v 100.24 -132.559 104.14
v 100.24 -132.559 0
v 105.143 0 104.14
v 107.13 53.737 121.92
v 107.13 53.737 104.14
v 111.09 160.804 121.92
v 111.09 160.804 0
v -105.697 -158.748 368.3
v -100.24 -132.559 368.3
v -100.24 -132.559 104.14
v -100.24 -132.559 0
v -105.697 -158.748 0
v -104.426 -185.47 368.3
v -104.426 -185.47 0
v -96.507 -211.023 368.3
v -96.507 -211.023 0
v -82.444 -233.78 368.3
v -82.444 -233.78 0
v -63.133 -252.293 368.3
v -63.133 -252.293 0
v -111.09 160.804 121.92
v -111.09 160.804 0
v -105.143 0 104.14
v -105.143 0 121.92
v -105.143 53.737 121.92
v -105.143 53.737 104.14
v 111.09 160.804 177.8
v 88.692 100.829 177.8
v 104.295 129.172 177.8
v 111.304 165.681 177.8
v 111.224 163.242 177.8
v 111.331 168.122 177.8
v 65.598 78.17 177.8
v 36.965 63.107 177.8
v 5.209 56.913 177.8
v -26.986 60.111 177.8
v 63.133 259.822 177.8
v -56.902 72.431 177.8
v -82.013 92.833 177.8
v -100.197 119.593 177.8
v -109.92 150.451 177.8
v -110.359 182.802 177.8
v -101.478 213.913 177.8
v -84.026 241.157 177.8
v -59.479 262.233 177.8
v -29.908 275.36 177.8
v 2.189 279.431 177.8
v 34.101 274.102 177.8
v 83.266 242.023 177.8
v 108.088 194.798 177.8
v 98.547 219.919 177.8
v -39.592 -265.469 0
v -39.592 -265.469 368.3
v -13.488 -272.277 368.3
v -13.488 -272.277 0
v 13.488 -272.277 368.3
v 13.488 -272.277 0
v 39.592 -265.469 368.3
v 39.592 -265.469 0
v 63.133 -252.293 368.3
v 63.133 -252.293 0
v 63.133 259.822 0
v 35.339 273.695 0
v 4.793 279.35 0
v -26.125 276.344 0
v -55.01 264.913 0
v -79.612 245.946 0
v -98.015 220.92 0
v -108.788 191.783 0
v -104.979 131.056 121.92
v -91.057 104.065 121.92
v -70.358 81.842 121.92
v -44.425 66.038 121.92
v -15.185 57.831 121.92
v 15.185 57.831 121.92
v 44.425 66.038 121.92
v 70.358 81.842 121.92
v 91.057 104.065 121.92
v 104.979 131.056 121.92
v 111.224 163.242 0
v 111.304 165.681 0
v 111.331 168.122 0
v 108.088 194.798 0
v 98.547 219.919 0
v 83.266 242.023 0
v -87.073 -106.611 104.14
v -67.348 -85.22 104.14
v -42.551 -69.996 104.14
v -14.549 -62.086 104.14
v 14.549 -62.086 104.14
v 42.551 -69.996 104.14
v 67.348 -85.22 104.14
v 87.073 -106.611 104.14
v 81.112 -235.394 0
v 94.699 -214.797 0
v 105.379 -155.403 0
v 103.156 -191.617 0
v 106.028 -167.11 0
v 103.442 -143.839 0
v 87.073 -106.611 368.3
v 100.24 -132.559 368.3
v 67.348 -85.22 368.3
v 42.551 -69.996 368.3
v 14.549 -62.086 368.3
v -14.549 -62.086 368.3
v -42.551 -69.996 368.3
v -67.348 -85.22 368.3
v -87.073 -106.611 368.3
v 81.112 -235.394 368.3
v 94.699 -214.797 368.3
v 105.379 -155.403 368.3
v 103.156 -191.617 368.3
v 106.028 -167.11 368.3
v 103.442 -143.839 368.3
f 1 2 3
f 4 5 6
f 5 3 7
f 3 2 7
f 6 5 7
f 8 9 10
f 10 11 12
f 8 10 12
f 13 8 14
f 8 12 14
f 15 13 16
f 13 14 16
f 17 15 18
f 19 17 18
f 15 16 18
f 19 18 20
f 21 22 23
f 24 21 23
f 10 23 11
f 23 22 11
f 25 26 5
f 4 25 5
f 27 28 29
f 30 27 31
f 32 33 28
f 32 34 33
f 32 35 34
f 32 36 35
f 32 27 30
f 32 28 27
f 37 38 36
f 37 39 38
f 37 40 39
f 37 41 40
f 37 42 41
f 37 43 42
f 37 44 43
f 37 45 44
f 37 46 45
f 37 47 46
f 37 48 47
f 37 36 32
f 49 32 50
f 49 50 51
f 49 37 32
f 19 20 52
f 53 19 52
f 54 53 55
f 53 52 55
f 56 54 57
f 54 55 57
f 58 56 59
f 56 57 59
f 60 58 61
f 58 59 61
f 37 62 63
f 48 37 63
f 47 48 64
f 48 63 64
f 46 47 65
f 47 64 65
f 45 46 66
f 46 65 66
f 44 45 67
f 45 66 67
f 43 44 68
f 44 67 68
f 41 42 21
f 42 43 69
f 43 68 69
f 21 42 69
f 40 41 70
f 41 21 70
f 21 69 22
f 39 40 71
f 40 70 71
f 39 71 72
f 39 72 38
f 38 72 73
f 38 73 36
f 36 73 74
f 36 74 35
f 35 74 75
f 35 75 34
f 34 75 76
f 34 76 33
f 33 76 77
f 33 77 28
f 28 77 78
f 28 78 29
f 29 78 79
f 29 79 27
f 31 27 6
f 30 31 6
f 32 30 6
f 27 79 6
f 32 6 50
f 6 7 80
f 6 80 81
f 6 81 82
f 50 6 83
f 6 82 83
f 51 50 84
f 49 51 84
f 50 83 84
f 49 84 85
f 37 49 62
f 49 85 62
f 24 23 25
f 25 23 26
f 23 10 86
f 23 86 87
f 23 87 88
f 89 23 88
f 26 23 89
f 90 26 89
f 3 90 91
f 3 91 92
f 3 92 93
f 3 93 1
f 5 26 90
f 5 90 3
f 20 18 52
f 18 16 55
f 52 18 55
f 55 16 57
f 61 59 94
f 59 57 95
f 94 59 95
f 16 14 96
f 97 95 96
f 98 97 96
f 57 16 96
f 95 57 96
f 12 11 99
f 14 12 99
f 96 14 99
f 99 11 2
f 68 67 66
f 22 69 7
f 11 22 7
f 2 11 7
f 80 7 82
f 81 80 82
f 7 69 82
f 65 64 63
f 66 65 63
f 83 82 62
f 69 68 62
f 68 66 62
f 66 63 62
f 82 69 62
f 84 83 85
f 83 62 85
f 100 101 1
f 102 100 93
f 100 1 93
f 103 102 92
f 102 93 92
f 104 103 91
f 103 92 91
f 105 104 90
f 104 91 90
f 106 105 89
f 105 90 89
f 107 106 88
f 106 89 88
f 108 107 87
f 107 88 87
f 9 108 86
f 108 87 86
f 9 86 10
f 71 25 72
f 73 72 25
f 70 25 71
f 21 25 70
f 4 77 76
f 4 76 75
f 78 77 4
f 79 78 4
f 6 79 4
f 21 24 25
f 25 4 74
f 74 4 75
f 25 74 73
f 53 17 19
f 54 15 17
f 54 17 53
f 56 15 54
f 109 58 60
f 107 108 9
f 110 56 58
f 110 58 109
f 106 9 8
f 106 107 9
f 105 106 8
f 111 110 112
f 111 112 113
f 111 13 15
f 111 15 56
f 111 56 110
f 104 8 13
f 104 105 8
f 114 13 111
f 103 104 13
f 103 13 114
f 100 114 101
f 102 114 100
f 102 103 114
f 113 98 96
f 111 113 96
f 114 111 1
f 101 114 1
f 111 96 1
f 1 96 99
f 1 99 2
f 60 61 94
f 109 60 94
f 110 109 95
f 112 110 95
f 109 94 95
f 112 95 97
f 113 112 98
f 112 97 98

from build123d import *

# Parameters (mm, degrees)
F1_DEPTH = 368.3
F0_W     = 105.1427514449
F0_H     = 53.7366458577
F2_DEPTH = 104.14
F3_DEPTH = 121.92
F4_DEPTH = 177.8


with BuildPart() as f1:
    # F0 (on Top) → F1 (new body)
    with BuildSketch(Plane.XY):
        Polygon((0, -167.1104878187), (-63.1326169969, -252.2933322156), (63.1326169969, -252.2933322156), align=None)
        with BuildLine():
            ThreePointArc((106.0275639087, -167.1104878187), (104.5706585234, -149.5941615946), (100.2399805091, -132.5592126476))
            Line((100.2399805091, -132.5592126476), (0, -132.5592126476))
            Line((0, -132.5592126476), (0, -167.1104878187))
            Line((0, -167.1104878187), (63.1326169969, -252.2933322156))
            ThreePointArc((63.1326169969, -252.2933322156), (94.6985794291, -214.797208848), (106.0275639087, -167.1104878187))
        make_face()
        with BuildLine():
            Line((0, -132.5592126476), (-100.2399805091, -132.5592126476))
            ThreePointArc((-100.2399805091, -132.5592126476), (-101.275447425, -198.4972375273), (-63.1326169969, -252.2933322156))
            Line((-63.1326169969, -252.2933322156), (0, -167.1104878187))
            Line((0, -167.1104878187), (0, -132.5592126476))
        make_face()
        Polygon((0, -61.08292391), (-100.2399805091, -132.5592126476), (0, -132.5592126476), align=None)
        Polygon((0, -132.5592126476), (100.2399805091, -132.5592126476), (0, -61.08292391), align=None)
        with BuildLine():
            Line((63.1326169969, -252.2933322156), (-63.1326169969, -252.2933322156))
            ThreePointArc((-63.1326169969, -252.2933322156), (0, -273.1380517274), (63.1326169969, -252.2933322156))
        make_face()
        with BuildLine():
            ThreePointArc((0, -61.08292391), (-61.5567087005, -80.7819530091), (-100.2399805091, -132.5592126476))
            Line((-100.2399805091, -132.5592126476), (0, -61.08292391))
        make_face()
        with BuildLine():
            Line((0, -61.08292391), (100.2399805091, -132.5592126476))
            ThreePointArc((100.2399805091, -132.5592126476), (61.5567087005, -80.7819530091), (0, -61.08292391))
        make_face()
    extrude(amount=F1_DEPTH)

    # F0 (on Top) → F2 (join)
    with BuildSketch(Plane.XY):
        with BuildLine():
            Line((0, 0), (-105.1427514449, 0))
            Line((-105.1427514449, 0), (-100.2399805091, -132.5592126476))
            ThreePointArc((-100.2399805091, -132.5592126476), (-61.5567087005, -80.7819530091), (0, -61.08292391))
            Line((0, -61.08292391), (0, 0))
        make_face()
        with BuildLine():
            Line((100.2399805091, -132.5592126476), (105.1427514449, 0))
            Line((105.1427514449, 0), (0, 0))
            Line((0, 0), (0, -61.08292391))
            ThreePointArc((0, -61.08292391), (61.5567087005, -80.7819530091), (100.2399805091, -132.5592126476))
        make_face()
        Polygon((105.1427514449, 0), (107.1302290426, 53.7366458577), (0, 53.7366458577), (0, 0), align=None)
        with Locations((-52.5713757225, 26.8683229289)):
            Rectangle(F0_W, F0_H)
    extrude(amount=F2_DEPTH)

    # F0 (on Top) → F3 (join)
    with BuildSketch(Plane.XY):
        with BuildLine():
            Line((0, 53.7366458577), (0, 56.7909614803))
            ThreePointArc((0, 56.7909614803), (-76.0917297258, 86.8530505453), (-111.0901819179, 160.8043106819))
            Line((-111.0901819179, 160.8043106819), (-105.1427514449, 0))
            Line((-105.1427514449, 0), (-105.1427514449, 53.7366458577))
            Line((-105.1427514449, 53.7366458577), (0, 53.7366458577))
        make_face()
        with BuildLine():
            Line((107.1302290426, 53.7366458577), (111.0901819179, 160.8043106819))
            ThreePointArc((111.0901819179, 160.8043106819), (76.0917297258, 86.8530505453), (0, 56.7909614803))
            Line((0, 56.7909614803), (0, 53.7366458577))
            Line((0, 53.7366458577), (107.1302290426, 53.7366458577))
        make_face()
    extrude(amount=F3_DEPTH)

    # F0 (on Top) → F4 (join)
    with BuildSketch(Plane.XY):
        with BuildLine():
            ThreePointArc((0, 56.7909614803), (76.0917297258, 86.8530505453), (111.0901819179, 160.8043106819))
            Line((111.0901819179, 160.8043106819), (0, 56.7909614803))
        make_face()
        Polygon((0, 56.7909614803), (111.0901819179, 160.8043106819), (0, 160.8043106819), align=None)
        with BuildLine():
            ThreePointArc((-111.0901819179, 160.8043106819), (-76.0917297258, 86.8530505453), (0, 56.7909614803))
            Line((0, 56.7909614803), (-111.0901819179, 160.8043106819))
        make_face()
        with BuildLine():
            Line((0, 168.1218892336), (-63.1326169969, 259.8216610192))
            ThreePointArc((-63.1326169969, 259.8216610192), (-100.1973294673, 216.6509593053), (-111.0901819179, 160.8043106819))
            Line((-111.0901819179, 160.8043106819), (0, 160.8043106819))
            Line((0, 160.8043106819), (0, 168.1218892336))
        make_face()
        Polygon((-111.0901819179, 160.8043106819), (0, 56.7909614803), (0, 160.8043106819), align=None)
        with BuildLine():
            Line((-63.1326169969, 259.8216610192), (63.1326169969, 259.8216610192))
            ThreePointArc((63.1326169969, 259.8216610192), (0, 279.4528169869), (-63.1326169969, 259.8216610192))
        make_face()
        with BuildLine():
            ThreePointArc((111.0901819179, 160.8043106819), (111.270725017, 164.4611203793), (111.3309277533, 168.1218892336))
            ThreePointArc((111.3309277533, 168.1218892336), (98.5474208089, 219.9193923233), (63.1326169969, 259.8216610192))
            Line((63.1326169969, 259.8216610192), (0, 168.1218892336))
            Line((0, 168.1218892336), (0, 160.8043106819))
            Line((0, 160.8043106819), (111.0901819179, 160.8043106819))
        make_face()
        Polygon((0, 168.1218892336), (63.1326169969, 259.8216610192), (-63.1326169969, 259.8216610192), align=None)
    extrude(amount=F4_DEPTH)


solid = f1.part
